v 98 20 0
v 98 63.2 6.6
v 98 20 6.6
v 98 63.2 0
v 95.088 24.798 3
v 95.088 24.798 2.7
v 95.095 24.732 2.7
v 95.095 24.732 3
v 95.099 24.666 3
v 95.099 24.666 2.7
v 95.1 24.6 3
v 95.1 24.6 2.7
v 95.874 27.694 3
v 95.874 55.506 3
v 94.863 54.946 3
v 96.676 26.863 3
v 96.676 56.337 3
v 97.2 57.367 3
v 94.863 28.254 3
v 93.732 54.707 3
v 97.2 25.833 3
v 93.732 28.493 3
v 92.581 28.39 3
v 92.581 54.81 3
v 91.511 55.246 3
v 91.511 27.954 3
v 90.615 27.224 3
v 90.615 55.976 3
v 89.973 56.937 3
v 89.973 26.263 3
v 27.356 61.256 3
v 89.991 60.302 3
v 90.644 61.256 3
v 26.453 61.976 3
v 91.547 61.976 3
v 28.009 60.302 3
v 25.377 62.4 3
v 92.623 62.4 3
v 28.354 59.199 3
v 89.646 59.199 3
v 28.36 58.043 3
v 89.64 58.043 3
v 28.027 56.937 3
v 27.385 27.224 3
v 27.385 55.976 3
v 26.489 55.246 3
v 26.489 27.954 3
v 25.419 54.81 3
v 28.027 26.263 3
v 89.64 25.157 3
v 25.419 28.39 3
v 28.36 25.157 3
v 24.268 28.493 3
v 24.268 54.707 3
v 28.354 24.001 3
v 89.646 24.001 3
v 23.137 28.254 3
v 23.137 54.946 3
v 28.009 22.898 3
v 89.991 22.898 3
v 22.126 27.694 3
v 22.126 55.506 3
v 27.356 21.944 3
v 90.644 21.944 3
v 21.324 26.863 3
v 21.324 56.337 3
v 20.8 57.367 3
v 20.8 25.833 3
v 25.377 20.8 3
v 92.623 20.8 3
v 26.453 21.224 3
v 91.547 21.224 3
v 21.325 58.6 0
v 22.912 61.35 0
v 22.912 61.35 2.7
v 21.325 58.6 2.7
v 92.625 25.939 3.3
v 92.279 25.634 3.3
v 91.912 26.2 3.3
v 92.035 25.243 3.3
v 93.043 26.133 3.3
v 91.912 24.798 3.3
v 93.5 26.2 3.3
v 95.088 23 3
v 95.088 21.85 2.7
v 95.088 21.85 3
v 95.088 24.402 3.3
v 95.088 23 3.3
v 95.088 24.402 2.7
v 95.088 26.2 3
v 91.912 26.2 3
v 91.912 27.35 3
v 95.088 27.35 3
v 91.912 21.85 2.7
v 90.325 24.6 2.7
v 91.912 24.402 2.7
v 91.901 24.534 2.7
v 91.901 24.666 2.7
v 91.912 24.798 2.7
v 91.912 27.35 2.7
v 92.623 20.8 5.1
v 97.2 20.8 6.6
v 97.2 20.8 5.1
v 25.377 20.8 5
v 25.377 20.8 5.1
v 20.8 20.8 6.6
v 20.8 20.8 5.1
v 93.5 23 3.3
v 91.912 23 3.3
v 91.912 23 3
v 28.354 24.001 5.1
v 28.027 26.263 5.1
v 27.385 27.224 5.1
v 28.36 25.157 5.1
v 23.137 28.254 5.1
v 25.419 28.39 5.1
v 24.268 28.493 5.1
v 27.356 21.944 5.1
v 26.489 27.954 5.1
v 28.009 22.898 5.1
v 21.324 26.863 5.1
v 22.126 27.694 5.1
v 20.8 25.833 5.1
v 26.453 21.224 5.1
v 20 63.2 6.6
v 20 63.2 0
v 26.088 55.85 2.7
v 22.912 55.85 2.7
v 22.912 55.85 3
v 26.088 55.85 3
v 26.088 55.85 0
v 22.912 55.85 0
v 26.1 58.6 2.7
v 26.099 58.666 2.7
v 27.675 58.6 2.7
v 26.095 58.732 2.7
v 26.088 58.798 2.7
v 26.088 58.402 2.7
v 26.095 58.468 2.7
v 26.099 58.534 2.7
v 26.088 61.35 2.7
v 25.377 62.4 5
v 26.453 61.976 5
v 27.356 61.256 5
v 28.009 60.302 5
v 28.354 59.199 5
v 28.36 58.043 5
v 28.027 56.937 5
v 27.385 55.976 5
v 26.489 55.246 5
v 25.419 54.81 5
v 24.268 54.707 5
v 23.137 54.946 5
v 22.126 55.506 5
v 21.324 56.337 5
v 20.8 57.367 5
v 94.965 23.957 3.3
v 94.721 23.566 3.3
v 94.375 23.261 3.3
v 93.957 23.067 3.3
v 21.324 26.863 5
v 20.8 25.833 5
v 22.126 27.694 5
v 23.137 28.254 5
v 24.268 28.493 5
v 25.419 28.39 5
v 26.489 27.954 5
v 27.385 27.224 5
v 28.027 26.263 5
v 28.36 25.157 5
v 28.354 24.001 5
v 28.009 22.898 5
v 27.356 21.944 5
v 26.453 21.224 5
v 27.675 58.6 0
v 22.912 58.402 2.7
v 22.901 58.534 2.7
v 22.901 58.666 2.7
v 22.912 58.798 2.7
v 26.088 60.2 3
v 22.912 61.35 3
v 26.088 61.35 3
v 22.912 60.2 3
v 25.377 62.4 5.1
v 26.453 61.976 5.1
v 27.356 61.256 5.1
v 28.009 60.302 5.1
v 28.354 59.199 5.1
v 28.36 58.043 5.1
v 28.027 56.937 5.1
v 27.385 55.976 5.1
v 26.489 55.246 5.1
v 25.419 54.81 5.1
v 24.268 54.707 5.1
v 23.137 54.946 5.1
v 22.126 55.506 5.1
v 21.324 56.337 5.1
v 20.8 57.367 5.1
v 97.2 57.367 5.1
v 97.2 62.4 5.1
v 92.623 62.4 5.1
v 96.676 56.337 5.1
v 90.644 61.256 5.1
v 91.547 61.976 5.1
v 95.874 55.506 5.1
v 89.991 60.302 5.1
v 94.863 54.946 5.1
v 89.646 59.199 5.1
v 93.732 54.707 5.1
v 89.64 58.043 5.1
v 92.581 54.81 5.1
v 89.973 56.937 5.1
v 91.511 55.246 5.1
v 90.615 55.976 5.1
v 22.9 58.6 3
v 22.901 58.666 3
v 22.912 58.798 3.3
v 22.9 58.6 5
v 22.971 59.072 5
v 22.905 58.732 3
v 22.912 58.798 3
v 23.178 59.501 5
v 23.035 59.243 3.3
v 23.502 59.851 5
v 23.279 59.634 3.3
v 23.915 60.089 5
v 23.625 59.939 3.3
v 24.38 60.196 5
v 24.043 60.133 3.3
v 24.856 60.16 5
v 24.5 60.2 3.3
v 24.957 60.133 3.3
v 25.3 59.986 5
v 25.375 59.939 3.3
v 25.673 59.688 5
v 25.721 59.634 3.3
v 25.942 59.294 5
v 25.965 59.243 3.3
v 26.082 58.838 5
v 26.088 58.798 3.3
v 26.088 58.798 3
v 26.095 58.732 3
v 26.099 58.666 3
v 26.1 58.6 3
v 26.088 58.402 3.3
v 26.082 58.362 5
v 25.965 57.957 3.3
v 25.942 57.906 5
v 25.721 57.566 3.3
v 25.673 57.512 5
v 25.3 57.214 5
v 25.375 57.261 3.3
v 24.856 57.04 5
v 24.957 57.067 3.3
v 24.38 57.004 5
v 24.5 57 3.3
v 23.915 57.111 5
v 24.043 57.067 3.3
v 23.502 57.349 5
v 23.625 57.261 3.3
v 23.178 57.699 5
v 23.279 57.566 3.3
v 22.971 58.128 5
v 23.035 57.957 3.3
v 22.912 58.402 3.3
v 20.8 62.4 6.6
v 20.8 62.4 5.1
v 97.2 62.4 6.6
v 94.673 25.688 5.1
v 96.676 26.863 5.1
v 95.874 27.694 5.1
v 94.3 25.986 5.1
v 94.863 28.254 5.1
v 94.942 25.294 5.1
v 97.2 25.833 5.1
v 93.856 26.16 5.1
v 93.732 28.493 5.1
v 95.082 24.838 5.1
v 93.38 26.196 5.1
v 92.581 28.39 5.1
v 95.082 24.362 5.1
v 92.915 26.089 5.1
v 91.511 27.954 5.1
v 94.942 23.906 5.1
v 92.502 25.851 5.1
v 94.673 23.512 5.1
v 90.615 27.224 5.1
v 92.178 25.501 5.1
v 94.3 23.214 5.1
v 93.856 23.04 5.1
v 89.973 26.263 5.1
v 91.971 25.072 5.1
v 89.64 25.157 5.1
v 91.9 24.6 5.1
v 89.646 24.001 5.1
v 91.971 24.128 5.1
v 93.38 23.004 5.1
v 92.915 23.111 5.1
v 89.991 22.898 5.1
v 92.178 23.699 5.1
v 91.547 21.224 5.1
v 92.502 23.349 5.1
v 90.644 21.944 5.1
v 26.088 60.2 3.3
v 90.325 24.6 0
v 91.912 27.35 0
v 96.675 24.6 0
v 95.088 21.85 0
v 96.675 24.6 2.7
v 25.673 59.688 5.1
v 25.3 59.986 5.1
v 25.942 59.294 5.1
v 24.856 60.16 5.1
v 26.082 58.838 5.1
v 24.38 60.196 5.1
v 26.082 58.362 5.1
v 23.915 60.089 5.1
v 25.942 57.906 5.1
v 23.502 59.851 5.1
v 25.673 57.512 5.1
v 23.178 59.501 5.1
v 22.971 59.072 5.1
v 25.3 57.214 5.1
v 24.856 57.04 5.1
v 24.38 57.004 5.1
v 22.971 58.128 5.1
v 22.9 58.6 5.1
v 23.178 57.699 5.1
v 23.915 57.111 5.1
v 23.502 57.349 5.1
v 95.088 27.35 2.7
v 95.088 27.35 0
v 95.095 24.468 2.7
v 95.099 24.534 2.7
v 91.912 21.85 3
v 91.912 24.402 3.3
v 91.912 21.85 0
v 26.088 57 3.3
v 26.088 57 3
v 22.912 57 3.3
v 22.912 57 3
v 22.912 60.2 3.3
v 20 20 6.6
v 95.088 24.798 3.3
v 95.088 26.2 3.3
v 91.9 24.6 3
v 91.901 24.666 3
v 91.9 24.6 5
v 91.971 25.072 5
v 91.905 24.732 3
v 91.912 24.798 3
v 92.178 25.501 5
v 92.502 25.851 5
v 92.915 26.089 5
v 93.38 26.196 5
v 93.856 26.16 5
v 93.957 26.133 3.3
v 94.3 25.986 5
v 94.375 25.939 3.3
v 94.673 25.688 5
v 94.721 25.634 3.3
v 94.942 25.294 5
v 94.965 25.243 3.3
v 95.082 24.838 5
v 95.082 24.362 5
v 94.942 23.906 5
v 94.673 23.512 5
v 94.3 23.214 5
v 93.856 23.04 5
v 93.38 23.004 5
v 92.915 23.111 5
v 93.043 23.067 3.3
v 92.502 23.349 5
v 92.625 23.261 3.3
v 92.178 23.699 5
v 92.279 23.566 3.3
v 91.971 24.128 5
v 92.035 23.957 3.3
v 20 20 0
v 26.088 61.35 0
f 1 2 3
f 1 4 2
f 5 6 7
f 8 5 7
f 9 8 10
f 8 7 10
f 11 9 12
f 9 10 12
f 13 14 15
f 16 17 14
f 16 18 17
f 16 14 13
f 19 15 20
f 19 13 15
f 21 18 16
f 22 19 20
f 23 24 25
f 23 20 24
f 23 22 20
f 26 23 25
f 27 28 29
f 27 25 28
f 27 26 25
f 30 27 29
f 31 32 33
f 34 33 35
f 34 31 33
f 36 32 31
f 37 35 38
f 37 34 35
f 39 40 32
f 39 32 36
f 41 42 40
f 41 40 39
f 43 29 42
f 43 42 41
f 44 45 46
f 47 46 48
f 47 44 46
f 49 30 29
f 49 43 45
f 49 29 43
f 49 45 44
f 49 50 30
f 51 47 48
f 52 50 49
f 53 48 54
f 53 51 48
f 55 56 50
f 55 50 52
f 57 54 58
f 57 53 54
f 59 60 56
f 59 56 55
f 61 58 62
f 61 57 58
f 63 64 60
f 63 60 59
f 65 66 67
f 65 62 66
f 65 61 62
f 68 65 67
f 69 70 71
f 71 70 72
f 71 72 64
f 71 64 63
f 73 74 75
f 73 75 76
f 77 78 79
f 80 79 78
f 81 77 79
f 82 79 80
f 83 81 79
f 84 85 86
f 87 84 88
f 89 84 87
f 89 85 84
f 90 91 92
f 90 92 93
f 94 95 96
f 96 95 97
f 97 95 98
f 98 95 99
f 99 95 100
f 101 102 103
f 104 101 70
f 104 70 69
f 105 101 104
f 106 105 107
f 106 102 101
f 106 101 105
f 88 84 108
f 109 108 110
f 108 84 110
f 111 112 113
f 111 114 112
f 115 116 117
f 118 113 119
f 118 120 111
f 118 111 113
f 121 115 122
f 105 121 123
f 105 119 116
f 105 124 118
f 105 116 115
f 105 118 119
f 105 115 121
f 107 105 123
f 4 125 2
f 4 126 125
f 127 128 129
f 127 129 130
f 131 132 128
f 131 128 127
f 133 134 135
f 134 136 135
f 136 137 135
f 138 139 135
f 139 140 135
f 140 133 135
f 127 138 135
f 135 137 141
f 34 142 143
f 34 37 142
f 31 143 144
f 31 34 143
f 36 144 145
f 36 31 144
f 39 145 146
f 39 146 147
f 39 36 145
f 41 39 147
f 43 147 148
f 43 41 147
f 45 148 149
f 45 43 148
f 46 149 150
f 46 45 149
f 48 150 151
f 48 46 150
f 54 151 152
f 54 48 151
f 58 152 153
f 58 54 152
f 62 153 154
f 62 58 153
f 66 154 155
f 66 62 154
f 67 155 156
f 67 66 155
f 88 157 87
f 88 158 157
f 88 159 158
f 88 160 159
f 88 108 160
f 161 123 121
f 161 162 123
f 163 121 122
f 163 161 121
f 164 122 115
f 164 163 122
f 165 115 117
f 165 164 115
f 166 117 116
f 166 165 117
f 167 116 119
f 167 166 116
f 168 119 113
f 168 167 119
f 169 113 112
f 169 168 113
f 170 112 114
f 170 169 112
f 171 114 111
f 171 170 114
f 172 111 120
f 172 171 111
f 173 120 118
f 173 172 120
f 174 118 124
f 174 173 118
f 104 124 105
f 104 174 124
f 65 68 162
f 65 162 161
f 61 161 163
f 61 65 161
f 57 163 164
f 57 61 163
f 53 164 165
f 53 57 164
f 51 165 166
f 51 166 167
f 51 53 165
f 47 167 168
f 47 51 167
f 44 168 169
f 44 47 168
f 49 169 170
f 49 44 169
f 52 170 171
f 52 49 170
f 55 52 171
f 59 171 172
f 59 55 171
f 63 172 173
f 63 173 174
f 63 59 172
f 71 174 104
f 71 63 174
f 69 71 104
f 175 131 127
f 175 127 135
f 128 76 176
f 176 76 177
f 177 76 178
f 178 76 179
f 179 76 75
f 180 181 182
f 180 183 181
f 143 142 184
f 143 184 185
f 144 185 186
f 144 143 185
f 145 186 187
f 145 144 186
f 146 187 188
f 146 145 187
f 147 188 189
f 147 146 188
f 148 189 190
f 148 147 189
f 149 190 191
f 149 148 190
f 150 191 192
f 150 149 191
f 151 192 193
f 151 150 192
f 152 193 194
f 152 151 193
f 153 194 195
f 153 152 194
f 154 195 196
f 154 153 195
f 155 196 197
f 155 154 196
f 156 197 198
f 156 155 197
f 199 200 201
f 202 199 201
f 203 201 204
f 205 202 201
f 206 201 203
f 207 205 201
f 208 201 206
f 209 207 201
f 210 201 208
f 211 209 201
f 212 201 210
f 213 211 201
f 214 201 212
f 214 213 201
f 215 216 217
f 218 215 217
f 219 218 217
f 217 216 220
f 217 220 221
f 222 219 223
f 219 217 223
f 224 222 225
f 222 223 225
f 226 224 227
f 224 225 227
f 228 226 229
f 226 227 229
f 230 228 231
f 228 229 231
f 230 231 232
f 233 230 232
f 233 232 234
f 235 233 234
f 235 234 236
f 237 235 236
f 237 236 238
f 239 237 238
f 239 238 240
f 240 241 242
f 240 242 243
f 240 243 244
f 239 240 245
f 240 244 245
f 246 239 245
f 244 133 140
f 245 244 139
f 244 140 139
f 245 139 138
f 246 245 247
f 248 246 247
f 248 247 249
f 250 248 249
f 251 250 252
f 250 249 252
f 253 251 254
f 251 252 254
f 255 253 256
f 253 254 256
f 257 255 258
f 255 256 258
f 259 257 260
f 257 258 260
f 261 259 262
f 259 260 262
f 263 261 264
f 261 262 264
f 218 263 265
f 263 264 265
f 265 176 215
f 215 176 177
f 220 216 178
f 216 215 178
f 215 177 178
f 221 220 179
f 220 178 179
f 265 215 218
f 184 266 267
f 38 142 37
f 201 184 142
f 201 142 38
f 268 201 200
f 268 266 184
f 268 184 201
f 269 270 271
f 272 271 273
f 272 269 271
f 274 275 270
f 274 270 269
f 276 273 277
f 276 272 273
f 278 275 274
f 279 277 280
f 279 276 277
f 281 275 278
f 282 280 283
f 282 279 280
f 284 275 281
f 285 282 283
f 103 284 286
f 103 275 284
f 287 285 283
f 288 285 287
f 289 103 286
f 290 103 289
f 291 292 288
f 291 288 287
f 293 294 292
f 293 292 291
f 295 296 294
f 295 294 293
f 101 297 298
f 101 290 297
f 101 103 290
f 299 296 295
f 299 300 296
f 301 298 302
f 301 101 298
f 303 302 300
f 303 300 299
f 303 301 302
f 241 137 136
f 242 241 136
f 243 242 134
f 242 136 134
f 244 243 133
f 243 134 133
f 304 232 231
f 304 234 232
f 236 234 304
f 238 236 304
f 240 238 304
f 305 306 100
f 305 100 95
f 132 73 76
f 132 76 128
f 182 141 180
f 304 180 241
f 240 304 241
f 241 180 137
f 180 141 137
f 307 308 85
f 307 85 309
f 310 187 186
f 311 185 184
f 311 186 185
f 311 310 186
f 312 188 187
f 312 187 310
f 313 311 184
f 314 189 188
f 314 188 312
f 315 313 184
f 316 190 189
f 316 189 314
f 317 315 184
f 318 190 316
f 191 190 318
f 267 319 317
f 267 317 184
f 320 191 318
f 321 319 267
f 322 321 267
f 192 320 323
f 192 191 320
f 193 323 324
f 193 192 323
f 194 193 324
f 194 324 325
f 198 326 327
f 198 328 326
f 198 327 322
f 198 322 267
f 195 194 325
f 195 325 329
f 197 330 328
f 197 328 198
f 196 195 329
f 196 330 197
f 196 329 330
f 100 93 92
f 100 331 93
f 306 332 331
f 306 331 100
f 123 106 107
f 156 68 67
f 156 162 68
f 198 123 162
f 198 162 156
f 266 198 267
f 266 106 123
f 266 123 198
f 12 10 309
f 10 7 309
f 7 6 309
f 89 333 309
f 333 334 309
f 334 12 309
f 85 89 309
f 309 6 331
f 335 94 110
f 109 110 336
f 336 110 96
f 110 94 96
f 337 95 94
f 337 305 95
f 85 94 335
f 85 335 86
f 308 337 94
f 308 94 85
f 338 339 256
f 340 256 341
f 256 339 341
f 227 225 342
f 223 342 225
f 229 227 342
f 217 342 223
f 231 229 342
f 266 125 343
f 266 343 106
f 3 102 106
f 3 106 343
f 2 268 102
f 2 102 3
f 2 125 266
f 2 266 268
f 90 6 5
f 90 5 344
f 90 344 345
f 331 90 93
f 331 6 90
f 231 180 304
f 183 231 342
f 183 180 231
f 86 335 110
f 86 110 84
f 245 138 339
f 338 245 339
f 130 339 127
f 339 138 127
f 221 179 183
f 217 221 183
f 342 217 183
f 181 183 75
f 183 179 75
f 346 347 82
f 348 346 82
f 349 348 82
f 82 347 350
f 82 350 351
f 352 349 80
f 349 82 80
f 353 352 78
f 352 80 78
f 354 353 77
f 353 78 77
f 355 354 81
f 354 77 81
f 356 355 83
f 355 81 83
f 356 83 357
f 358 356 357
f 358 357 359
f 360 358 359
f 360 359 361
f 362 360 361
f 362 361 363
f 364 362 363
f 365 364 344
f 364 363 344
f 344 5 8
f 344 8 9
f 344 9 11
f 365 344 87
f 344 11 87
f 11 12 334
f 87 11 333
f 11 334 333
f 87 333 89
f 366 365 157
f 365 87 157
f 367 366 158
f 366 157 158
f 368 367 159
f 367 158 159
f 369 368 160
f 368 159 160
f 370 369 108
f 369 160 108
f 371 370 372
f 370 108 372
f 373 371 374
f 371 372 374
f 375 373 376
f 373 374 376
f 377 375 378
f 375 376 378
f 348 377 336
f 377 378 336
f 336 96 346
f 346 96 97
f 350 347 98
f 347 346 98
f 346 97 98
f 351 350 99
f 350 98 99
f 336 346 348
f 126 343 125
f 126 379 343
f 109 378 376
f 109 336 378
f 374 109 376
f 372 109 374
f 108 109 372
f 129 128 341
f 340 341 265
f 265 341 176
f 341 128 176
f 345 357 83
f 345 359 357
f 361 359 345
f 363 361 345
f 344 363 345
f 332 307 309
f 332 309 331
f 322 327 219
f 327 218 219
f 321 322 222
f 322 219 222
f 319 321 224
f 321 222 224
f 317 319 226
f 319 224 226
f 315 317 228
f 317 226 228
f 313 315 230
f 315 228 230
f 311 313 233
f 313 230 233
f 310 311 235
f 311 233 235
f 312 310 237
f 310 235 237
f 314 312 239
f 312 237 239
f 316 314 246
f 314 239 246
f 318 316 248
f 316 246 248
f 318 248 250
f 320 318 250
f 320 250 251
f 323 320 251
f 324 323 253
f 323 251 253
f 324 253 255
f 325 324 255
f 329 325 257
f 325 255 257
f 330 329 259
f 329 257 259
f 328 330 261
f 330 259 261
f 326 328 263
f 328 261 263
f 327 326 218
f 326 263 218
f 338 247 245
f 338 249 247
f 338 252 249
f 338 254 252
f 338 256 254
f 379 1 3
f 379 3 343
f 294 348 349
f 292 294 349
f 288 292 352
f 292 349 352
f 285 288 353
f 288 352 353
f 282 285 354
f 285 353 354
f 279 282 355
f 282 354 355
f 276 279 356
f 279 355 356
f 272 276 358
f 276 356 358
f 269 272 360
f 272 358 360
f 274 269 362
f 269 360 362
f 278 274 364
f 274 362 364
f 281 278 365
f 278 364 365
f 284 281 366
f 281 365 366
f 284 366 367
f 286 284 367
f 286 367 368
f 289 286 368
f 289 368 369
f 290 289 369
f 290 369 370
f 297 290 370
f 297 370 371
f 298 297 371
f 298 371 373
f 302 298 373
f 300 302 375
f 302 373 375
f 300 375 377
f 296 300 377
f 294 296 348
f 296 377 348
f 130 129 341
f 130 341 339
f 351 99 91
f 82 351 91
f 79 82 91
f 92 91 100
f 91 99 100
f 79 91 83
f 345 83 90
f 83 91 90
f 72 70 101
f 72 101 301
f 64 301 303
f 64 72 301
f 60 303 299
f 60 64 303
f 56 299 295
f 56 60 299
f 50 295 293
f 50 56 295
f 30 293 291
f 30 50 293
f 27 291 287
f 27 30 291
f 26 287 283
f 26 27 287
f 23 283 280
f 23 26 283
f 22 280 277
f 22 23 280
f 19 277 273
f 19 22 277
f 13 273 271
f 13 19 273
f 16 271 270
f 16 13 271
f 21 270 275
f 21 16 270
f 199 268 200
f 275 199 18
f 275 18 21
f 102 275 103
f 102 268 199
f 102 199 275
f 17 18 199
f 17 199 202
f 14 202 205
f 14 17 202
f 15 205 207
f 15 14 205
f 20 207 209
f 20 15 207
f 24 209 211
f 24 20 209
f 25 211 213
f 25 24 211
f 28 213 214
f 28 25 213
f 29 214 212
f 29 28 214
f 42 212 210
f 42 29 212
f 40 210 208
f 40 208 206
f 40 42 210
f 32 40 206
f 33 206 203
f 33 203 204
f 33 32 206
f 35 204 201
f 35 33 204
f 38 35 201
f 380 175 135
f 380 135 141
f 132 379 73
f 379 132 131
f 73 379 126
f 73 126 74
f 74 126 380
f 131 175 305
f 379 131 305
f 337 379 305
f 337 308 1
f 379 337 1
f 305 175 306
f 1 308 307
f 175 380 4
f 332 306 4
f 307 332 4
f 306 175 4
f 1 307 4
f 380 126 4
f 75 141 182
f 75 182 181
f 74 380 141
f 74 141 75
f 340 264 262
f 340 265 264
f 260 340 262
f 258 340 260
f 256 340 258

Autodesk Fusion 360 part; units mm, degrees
sketch "Sketch1" plane through (0, 0, 0) normal (0, 0, 1) x (1, 0, 0)
  line L0 (20, 63.2) -> (98, 63.2)
  line L1 (98, 63.2) -> (98, 20)
  line L2 (98, 20) -> (20, 20)
  line L3 (20, 20) -> (20, 63.2)
  dimension "d1" = 78
  dimension "d2" = 20
  dimension "d4" = 43.2
  dimension "d5" = 20
extrude "Extrude4" add sketch "Sketch1" along normal blind 6.6
sketch "Profondeurboite" plane through (0, 0, 6.6) normal (0, 0, 1) x (-1, 0, 0)
  line L0 (-20, -20) -> (-98, -20)
  line L1 (-98, -20) -> (-98, -63.2)
  line L2 (-98, -63.2) -> (-20, -63.2)
  line L3 (-20, -63.2) -> (-20, -20)
  line L4 (-97.2, -20.8) -> (-20.8, -20.8)
  line L5 (-20.8, -20.8) -> (-20.8, -62.4)
  line L6 (-20.8, -62.4) -> (-97.2, -62.4)
  line L7 (-97.2, -62.4) -> (-97.2, -20.8)
  dimension "d20" = 76.4
  dimension "d21" = 41.6
  dimension "d22" = 0.8
  dimension "d23" = 0.8
extrude "Extrude6" cut sketch "Profondeurboite" against normal blind 3.6 contours L4 L5 L6 L7
sketch "trous pour ecrous" plane through (0, 0, 0) normal (0, 0, 1) x (1, 0, 0)
  line L0 (20, 20) -> (20, 63.2)
  line L1 (20, 63.2) -> (98, 63.2)
  line L2 (98, 20) -> (20, 20)
  line L3 (98, 63.2) -> (98, 20)
  line L4 (26.0877, 55.85) -> (27.6754, 58.6)
  line L5 (27.6754, 58.6) -> (26.0877, 61.35)
  line L6 (26.0877, 61.35) -> (22.9123, 61.35)
  line L7 (22.9123, 61.35) -> (21.3246, 58.6)
  line L8 (21.3246, 58.6) -> (22.9123, 55.85)
  line L9 (22.9123, 55.85) -> (26.0877, 55.85)
  line L10 (95.0877, 21.85) -> (96.6754, 24.6)
  line L11 (96.6754, 24.6) -> (95.0877, 27.35)
  line L12 (95.0877, 27.35) -> (91.9123, 27.35)
  line L13 (91.9123, 27.35) -> (90.3246, 24.6)
  line L14 (90.3246, 24.6) -> (91.9123, 21.85)
  line L15 (91.9123, 21.85) -> (95.0877, 21.85)
  circle A0 centre (24.5, 58.6) radius 1.6
  circle A1 centre (93.5, 24.6) radius 1.6
  point P0 (24.5, 58.6)
  point P1 (93.5, 24.6)
  dimension "d32" = 2.75
  dimension "d33" = 4.5
  dimension "d34" = 4.6
  dimension "d35" = 2.75
  dimension "d36" = 4.6
  dimension "d37" = 4.5
  dimension "d38" = 3.2
  dimension "d39" = 3.2
extrude "Extrude7" cut sketch "trous pour ecrous" along normal blind 3 contours A0 | A1
extrude "Extrude8" cut sketch "trous pour ecrous" along normal blind 2.7 contours L4 L5 L6 L7 L8 L9 | L10 L11 L12 L13 L14 L15
sketch "Extensions decrous" plane through (0, 0, 3) normal (0, 0, 1) x (-1, 0, 0)
  circle A0 centre (-24.5, -58.6) radius 1.6
  circle A1 centre (-93.5, -24.6) radius 1.6
  line L0 (-97.2, -62.4) -> (-20.8, -62.4)
  line L1 (-20.8, -62.4) -> (-20.8, -20.8)
  line L2 (-20.8, -20.8) -> (-97.2, -20.8)
  line L3 (-97.2, -20.8) -> (-97.2, -62.4)
  circle A2 centre (-24.5, -58.6) radius 3.9
  circle A3 centre (-93.5, -24.6) radius 3.9
  circle A4 centre (-93.5, -58.6) radius 3.9
  line L4 (-24.5, -58.6) -> (-97.2, -58.6)
  line L5 (-20, -63.2) -> (-98, -63.2)
  line L6 (-93.5, -24.6) -> (-93.5, -62.4)
  line L7 (-24.5, -58.6) -> (-24.5, -20.8)
  line L8 (-93.5, -24.6) -> (-20.8, -24.6)
  line L9 (-98, -20) -> (-20, -20)
  line L10 (-20, -20) -> (-20, -63.2)
  circle A5 centre (-24.5, -24.6) radius 3.9
  point P0 (-24.5, -58.6)
  point P1 (-93.5, -24.6)
  dimension "d44" = 7.8
  dimension "d45" = 7.8
  dimension "d48" = 7.8
  dimension "d49" = 7.8
extrude "Extrude9" add sketch "Extensions decrous" along normal blind 2 contours A0 L0 L1 A2 L4 L7 | A0 A2 L4 L7 | A1 L2 L3 A3 L6 L8 | A1 A3 L6 L8
extrude "Extrude10" add sketch "Extensions decrous" along normal blind 2 contours L7 L8 A5 | L1 L7 L8 A5 | A4 L4 L6 | L0 A4 L4 L6 | L2 L7 L8 A5 | L1 L2 L7 L8 A5 | L3 A4 L4 L6 | L0 L3 A4 L4 L6
sketch "planDroite" plane through (0, 0, 2.7) normal (0, 0, -1) x (1, 0, 0)
  circle A0 centre (93.5, -24.6) radius 1.6
  line L0 (95.0877, -21.85) -> (91.9123, -21.85)
  line L1 (91.9123, -21.85) -> (90.3246, -24.6)
  line L2 (90.3246, -24.6) -> (91.9123, -27.35)
  line L3 (91.9123, -27.35) -> (95.0877, -27.35)
  line L4 (95.0877, -27.35) -> (96.6754, -24.6)
  line L5 (96.6754, -24.6) -> (95.0877, -21.85)
  line L6 (95.0877, -21.85) -> (95.0877, -27.35)
  line L7 (91.9123, -21.85) -> (91.9123, -27.35)
  line L8 (91.9123, -26.2) -> (95.0877, -26.2)
  line L9 (95.0877, -23) -> (91.9123, -23)
sketch "PlanGauche" plane through (0, 0, 2.7) normal (0, 0, -1) x (1, 0, 0)
  circle A0 centre (24.5, -58.6) radius 1.6
  line L0 (26.0877, -55.85) -> (22.9123, -55.85)
  line L1 (22.9123, -55.85) -> (21.3246, -58.6)
  line L2 (21.3246, -58.6) -> (22.9123, -61.35)
  line L3 (22.9123, -61.35) -> (26.0877, -61.35)
  line L4 (26.0877, -61.35) -> (27.6754, -58.6)
  line L5 (27.6754, -58.6) -> (26.0877, -55.85)
  line L6 (22.9123, -55.85) -> (22.9123, -61.35)
  line L7 (26.0877, -61.35) -> (26.0877, -55.85)
  line L8 (26.0877, -57) -> (22.9123, -57)
  line L9 (26.0877, -60.2) -> (22.9123, -60.2)
extrude "Extrude11" cut sketch "planDroite" sketch "PlanGauche" against normal blind 0.6 contours A0 L6 L9 | A0 L6 L8 | A0 L7 L9 | A0 L7 L8 of sketch 2 contours A0 L7 L8 | A0 L7 L9 | A0 L6 L8 | A0 L6 L9
extrude "Extrude12" cut sketch "planDroite" sketch "PlanGauche" against normal blind 0.3 contours L0 L6 L7 L9 | L3 L6 L7 L8 of sketch 2 contours L0 L6 L7 L8 | L3 L6 L7 L9
extrude "Extrude13" add 4 faces at (96.4781, 61.785, 3) (96.4781, 21.415, 3) (21.5219, 61.785, 3) (21.5219, 21.415, 3) along direction (0, 0, 1) up to surface end surface through (0, 0, 5) normal (0, 0, 1) offset 0
extrude "Extrude14" add 4 faces at (95.6742, 60.7224, 5) (23.3643, 61.6298, 5) (22.3258, 22.4776, 5) (94.6357, 21.5702, 5) along direction (0, 0, 1) blind 0.1
